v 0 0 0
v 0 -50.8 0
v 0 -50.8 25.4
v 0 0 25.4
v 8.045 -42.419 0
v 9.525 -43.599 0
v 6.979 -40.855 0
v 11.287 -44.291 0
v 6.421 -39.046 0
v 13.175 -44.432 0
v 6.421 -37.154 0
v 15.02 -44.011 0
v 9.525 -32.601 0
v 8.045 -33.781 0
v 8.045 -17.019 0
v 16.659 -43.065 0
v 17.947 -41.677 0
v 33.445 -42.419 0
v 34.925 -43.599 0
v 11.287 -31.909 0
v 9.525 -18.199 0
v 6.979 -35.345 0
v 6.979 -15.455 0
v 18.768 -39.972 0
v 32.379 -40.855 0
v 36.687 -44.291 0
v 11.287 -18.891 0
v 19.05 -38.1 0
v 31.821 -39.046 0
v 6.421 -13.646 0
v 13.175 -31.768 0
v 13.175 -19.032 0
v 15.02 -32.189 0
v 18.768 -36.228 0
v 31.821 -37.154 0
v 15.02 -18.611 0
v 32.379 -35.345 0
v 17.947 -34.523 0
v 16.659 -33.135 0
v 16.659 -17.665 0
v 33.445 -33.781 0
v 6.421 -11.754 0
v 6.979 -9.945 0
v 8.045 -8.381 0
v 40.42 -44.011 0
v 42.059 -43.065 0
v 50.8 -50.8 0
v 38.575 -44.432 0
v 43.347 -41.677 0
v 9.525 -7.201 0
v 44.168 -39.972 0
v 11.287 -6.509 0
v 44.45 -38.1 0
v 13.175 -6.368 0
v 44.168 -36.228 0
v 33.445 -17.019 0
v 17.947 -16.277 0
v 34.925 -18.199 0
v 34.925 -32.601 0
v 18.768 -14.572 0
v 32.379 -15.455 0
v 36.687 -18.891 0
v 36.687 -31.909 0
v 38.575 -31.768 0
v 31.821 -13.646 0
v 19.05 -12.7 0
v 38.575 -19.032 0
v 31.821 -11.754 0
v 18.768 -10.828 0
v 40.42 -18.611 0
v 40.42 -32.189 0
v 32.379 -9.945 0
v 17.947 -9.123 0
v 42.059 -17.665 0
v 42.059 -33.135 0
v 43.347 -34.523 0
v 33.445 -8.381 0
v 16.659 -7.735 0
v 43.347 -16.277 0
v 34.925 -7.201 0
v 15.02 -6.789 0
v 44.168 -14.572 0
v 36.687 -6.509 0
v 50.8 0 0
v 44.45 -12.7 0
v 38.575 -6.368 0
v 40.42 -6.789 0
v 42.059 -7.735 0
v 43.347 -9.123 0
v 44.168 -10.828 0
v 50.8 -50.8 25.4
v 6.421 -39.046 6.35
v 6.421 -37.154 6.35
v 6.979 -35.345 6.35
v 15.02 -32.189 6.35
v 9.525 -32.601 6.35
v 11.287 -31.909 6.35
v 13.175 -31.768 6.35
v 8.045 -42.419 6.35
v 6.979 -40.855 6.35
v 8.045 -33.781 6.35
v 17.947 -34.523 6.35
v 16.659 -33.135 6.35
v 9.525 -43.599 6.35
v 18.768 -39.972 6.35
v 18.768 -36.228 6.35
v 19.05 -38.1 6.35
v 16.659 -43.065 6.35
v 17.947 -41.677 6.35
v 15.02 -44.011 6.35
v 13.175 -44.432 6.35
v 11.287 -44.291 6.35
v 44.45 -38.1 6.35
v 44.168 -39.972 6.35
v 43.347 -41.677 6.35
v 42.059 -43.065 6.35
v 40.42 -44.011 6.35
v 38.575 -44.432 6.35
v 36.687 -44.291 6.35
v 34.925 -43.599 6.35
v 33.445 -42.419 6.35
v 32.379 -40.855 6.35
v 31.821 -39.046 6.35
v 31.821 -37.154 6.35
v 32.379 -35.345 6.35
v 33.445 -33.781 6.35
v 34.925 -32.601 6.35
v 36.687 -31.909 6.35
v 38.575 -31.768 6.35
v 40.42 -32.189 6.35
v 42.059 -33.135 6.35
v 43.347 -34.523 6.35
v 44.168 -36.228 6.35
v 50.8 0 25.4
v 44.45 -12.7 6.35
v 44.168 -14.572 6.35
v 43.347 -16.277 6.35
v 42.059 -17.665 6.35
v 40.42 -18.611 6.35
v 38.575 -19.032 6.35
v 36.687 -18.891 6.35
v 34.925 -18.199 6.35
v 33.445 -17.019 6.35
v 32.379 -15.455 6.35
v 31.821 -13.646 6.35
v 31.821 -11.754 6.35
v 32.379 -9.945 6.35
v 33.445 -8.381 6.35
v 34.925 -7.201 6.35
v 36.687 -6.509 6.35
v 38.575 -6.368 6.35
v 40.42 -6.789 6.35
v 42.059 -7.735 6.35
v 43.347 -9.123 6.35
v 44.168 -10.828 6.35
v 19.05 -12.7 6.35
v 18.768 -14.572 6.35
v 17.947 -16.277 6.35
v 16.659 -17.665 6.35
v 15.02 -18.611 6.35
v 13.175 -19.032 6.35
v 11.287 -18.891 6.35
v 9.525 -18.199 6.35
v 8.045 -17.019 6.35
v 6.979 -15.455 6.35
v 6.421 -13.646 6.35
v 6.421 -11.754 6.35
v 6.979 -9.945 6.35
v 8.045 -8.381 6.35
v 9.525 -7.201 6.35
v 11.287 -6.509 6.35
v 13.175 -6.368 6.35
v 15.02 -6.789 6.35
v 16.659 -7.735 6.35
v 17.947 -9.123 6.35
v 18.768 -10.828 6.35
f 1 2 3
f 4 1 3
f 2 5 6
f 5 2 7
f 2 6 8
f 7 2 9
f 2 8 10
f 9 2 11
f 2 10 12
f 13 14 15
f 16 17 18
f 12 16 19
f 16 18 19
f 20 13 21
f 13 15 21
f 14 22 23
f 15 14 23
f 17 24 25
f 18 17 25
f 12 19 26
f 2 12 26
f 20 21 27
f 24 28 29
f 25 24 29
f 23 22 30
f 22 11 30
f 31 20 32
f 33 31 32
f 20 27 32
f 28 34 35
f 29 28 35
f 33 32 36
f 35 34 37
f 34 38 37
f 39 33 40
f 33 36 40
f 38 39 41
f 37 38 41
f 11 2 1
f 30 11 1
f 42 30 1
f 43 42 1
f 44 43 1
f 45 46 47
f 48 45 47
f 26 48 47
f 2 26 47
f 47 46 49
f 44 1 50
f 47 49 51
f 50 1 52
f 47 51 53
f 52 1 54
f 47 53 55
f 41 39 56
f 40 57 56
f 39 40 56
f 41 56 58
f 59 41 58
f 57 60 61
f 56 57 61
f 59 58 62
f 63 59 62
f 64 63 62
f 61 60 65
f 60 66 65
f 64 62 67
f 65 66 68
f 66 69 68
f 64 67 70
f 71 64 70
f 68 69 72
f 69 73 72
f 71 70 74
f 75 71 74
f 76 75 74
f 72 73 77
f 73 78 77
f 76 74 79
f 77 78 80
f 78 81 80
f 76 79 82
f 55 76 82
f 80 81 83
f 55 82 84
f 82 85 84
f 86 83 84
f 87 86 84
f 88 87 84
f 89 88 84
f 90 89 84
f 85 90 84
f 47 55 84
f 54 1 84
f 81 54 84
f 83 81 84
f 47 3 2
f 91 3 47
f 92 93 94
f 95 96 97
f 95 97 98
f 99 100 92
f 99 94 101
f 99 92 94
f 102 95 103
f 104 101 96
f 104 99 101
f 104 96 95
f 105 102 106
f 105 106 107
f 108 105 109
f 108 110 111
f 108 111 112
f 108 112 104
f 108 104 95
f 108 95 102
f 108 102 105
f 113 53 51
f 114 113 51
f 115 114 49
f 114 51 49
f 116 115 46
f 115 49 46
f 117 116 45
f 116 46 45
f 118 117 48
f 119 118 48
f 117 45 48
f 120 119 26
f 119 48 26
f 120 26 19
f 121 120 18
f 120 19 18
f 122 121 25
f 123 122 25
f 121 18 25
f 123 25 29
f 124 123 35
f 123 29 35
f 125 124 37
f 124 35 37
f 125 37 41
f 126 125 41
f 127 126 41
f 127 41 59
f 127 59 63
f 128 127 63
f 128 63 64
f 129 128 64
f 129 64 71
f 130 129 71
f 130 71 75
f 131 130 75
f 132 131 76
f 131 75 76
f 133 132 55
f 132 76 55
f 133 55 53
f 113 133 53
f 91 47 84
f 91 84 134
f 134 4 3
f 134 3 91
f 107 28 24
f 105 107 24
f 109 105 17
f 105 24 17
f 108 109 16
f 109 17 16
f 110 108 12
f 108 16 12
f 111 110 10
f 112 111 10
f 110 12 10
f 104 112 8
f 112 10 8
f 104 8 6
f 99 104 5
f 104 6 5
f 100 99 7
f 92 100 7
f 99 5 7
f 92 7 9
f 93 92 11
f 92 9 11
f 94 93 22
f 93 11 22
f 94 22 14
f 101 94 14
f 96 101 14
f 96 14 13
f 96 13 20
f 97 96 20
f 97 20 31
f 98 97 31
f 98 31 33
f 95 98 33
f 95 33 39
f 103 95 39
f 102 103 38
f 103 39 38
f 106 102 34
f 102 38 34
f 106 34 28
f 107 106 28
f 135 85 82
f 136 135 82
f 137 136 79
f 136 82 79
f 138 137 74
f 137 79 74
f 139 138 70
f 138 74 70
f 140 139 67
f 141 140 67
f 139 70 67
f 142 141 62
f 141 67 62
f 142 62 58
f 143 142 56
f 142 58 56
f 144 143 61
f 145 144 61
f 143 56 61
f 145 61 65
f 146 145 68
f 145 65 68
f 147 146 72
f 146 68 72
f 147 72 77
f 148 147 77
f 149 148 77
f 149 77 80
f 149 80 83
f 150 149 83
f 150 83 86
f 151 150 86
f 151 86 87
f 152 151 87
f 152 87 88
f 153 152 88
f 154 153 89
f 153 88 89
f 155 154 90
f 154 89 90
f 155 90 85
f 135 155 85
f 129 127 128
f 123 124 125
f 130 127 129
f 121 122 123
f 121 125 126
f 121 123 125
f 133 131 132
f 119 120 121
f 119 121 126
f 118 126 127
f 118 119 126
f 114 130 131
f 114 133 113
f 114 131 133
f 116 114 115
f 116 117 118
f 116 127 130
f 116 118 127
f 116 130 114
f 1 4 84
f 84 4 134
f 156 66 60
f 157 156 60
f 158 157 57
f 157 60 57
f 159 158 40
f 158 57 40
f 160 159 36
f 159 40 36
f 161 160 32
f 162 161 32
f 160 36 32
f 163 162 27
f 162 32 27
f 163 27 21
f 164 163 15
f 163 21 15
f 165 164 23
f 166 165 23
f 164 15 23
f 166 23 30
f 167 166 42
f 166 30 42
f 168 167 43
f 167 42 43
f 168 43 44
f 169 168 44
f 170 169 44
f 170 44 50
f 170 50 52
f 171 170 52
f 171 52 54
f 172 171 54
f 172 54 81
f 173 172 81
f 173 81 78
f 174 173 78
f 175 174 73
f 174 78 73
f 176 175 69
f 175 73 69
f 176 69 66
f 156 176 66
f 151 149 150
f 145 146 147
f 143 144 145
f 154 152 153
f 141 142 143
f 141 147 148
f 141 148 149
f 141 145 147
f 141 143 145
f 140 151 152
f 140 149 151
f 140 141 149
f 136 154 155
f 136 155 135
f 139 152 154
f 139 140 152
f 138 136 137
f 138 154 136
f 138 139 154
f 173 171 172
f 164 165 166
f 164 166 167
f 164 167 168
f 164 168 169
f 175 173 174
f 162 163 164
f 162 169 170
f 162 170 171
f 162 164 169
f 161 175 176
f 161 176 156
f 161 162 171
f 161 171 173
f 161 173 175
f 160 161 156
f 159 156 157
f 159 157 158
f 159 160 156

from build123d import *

# Parameters (mm, degrees)
F0_W     = 50.8
F0_H     = 25.4
F1_DEPTH = 50.8
F2_R     = 6.35
F3_DEPTH = 6.35


with BuildPart() as f1:
    # F0 (on Front) → F1 (new body)
    with BuildSketch(Plane.XZ):
        with Locations((25.4, 12.7)):
            Rectangle(F0_W, F0_H)
    extrude(amount=F1_DEPTH)

    # F2 (on face) → F3 (cut)
    with BuildSketch(Plane(origin=(0, 0, 0), x_dir=(1, 0, 0), z_dir=(0, 0, -1))):
        with Locations((12.7, 38.1)):
            Circle(F2_R)
        with Locations((12.7, 12.7)):
            Circle(F2_R)
        with Locations((38.1, 12.7)):
            Circle(F2_R)
        with Locations((38.1, 38.1)):
            Circle(F2_R)
    extrude(amount=-F3_DEPTH, mode=Mode.SUBTRACT)


solid = f1.part
